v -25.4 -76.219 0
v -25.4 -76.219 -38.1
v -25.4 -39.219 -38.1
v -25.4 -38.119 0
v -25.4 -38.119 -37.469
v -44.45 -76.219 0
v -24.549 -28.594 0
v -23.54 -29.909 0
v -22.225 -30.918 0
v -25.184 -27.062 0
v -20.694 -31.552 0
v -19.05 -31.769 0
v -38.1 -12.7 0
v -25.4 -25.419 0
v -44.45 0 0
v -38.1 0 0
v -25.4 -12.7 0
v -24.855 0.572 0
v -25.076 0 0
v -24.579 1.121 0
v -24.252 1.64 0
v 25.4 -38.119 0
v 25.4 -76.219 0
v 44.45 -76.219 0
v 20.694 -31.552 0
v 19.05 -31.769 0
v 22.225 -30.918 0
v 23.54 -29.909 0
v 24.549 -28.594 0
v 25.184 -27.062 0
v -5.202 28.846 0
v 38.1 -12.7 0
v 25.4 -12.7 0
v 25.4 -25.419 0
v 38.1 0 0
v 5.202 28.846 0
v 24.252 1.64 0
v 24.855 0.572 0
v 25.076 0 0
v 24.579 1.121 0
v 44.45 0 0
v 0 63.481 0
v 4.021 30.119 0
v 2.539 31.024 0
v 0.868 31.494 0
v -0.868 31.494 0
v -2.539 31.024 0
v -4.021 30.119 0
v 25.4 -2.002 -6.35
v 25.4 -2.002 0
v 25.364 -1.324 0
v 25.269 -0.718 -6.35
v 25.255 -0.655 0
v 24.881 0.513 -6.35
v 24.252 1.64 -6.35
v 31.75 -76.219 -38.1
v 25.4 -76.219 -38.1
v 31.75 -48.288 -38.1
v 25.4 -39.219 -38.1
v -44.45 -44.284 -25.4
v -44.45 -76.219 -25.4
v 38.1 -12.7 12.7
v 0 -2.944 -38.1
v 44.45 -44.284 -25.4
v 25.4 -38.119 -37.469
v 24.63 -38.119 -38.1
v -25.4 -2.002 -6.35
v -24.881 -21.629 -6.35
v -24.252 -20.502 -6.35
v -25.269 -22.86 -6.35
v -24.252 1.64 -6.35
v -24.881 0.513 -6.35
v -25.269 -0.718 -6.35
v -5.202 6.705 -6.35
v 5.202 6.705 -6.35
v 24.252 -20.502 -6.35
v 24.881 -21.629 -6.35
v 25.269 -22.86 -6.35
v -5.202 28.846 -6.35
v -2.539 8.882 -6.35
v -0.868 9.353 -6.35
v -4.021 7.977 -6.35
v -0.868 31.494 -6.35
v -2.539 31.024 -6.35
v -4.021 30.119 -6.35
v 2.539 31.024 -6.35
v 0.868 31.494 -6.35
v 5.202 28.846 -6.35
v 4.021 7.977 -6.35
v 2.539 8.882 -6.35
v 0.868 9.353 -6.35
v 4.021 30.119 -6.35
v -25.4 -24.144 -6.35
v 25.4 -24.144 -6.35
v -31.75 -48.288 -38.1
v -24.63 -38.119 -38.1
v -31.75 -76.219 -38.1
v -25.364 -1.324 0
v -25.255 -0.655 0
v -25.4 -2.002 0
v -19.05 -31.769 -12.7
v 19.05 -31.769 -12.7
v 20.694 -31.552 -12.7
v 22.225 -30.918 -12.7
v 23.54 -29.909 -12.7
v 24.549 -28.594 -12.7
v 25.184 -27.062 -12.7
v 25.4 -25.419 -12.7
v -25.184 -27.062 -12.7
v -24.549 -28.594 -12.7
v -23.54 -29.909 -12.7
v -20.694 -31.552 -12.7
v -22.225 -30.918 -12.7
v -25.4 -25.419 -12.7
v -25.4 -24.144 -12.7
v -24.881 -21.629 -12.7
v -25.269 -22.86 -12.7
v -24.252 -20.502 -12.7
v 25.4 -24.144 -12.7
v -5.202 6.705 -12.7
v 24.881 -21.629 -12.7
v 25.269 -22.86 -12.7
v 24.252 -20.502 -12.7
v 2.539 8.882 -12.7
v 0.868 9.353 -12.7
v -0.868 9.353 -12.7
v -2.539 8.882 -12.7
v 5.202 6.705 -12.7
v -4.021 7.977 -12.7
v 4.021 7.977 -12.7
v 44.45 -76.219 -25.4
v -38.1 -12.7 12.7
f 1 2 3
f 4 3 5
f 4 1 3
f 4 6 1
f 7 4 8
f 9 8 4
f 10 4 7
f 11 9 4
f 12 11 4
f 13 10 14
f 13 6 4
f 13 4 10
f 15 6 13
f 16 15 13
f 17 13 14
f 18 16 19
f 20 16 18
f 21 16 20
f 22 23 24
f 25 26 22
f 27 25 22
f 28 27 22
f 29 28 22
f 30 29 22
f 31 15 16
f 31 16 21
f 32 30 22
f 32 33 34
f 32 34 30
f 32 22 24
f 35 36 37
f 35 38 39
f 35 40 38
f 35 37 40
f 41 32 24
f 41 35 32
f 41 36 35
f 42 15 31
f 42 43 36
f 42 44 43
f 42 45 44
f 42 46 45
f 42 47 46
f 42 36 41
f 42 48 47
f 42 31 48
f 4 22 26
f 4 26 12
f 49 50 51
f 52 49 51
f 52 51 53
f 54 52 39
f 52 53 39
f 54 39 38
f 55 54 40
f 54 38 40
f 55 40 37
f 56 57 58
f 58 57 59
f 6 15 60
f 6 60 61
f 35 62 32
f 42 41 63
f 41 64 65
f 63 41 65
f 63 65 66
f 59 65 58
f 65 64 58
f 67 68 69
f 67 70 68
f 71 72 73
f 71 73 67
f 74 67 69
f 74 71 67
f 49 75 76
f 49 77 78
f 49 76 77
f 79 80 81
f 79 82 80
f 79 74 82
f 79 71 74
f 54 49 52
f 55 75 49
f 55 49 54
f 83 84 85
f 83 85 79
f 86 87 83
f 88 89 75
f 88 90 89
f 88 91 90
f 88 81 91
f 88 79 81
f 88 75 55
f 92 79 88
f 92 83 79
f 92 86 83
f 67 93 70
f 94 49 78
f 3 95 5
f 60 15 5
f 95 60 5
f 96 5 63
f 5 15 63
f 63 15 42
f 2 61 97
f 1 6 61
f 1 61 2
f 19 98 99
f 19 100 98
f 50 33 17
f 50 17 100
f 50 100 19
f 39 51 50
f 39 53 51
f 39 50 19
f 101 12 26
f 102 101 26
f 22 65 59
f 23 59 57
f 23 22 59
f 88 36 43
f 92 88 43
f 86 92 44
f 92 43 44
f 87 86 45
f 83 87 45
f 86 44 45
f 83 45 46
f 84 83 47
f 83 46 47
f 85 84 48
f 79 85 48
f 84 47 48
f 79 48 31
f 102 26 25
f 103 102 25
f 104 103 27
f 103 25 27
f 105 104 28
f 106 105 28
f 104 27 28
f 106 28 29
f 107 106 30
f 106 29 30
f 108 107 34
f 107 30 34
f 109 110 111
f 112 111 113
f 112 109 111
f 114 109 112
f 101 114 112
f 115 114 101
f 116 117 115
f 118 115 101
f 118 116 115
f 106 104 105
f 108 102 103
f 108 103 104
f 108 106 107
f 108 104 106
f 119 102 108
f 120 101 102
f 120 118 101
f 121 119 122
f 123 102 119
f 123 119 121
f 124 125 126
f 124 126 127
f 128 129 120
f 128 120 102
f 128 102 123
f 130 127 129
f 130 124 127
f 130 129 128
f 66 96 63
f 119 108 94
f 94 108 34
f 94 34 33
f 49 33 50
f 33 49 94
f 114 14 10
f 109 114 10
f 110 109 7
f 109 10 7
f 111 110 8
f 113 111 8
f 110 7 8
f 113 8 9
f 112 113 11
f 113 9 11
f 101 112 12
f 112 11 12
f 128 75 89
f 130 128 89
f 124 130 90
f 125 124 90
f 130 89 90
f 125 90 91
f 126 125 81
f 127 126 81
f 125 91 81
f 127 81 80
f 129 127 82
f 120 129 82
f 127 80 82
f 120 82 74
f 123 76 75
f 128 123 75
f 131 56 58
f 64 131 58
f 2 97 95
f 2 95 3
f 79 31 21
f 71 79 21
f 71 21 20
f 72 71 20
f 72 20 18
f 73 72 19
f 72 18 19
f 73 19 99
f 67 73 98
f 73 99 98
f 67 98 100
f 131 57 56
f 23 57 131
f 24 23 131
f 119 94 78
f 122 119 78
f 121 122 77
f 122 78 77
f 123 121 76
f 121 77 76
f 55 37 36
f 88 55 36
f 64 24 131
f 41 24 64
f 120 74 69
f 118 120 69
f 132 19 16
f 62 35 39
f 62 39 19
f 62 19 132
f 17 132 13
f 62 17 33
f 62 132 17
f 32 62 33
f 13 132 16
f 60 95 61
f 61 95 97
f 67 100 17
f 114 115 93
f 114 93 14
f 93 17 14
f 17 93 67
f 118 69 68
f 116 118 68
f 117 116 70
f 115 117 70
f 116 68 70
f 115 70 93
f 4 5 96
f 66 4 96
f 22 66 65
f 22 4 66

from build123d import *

# Parameters (mm, degrees)
F1_DEPTH    = 38.1
F2_T1_DEPTH = 273.4584537484
F2_T3_DEPTH = 273.4584537484
F3_SIZE     = 12.7
F5_DEPTH    = 6.35
F8_DEPTH    = 12.7
F9_DEPTH    = 38.1


# Not quite as in the source:
# - a fillet or chamfer that OpenCascade refuses, or shapes differently, is made with other operations: its cross-section is extruded or revolved along the edge and cut away or added


with BuildPart() as f1:
    # F0 (on Top) → F1 (new body)
    with BuildSketch(Plane.XY):
        Polygon((0, 63.4811788997), (-44.45, 0), (44.45, 0), align=None)
        Polygon((44.45, 0), (-44.45, 0), (-44.45, -76.2188211003), (-25.4, -76.2188211003), (-25.4, -38.1188211003), (25.4, -38.1188211003), (25.4, -76.2188211003), (44.45, -76.2188211003), align=None)
    extrude(amount=-F1_DEPTH)

    # F2: chamfer of 38.1 on 2 edges, made by hand

    # F2_s2 → F2_t1 (cut)
    with BuildSketch(Plane(origin=(70.8232650101, -101.1461047552, 0), x_dir=(0, 0, 1), z_dir=(-0.5735764364, 0.8191520443, 0))):
        Polygon((0, 36.4113083686), (-38.1, -1.6886916314), (-38.1, 36.4113083686), align=None)
    extrude(amount=F2_T1_DEPTH, mode=Mode.SUBTRACT)

    # F2_s4 → F2_t3 (cut)
    with BuildSketch(Plane(origin=(86.0260603809, 122.8579466609, 0), x_dir=(0, 0, 1), z_dir=(-0.5735764364, -0.8191520443, 0))):
        Polygon((0, 36.4113083686), (-38.1, -1.6886916314), (-38.1, 36.4113083686), align=None)
    extrude(amount=F2_T3_DEPTH, mode=Mode.SUBTRACT)

    # F3
    f3_edges = [f1.edges().sort_by_distance(p)[0] for p in [
        (44.45, -71.322072, -38.1),
        (-44.45, -71.322072, -38.1),
    ]]
    chamfer(f3_edges, length=F3_SIZE)

    # F4 (on Top) → F5 (cut)
    with BuildSketch(Plane.XY):
        with BuildLine():
            ThreePointArc((5.2016154812, 28.8462825899), (0, 31.5540722191), (-5.2016154812, 28.8462825899))
            Line((-5.2016154812, 28.8462825899), (-24.2516154812, 1.6400630614))
            ThreePointArc((-24.2516154812, 1.6400630614), (-25.1061026373, -0.0926654825), (-25.4, -2.0021473094))
            Line((-25.4, -2.0021473094), (-25.4, -25.4188211003))
            ThreePointArc((-25.4, -25.4188211003), (-23.5401280605, -29.9089491608), (-19.05, -31.7688211003))
            Line((-19.05, -31.7688211003), (0, -31.7688211003))
            Line((0, -31.7688211003), (19.05, -31.7688211003))
            ThreePointArc((19.05, -31.7688211003), (23.5401280605, -29.9089491608), (25.4, -25.4188211003))
            Line((25.4, -25.4188211003), (25.4, -2.0021473094))
            ThreePointArc((25.4, -2.0021473094), (25.1061026373, -0.0926654825), (24.2516154812, 1.6400630614))
            Line((24.2516154812, 1.6400630614), (5.2016154812, 28.8462825899))
        make_face()
    extrude(amount=-F5_DEPTH, mode=Mode.SUBTRACT)

    # F7 (on Top) → F8 (cut)
    with BuildSketch(Plane.XY):
        with BuildLine():
            Line((-19.05, -31.7688211003), (0, -31.7688211003))
            Line((0, -31.7688211003), (19.05, -31.7688211003))
            ThreePointArc((19.05, -31.7688211003), (23.5401280605, -29.9089491608), (25.4, -25.4188211003))
            Line((25.4, -25.4188211003), (25.4, -24.1439216138))
            ThreePointArc((25.4, -24.1439216138), (25.1061026373, -22.2344397869), (24.2516154812, -20.5017112429))
            Line((24.2516154812, -20.5017112429), (5.2016154812, 6.7045082855))
            ThreePointArc((5.2016154812, 6.7045082855), (0, 9.4122979147), (-5.2016154812, 6.7045082855))
            Line((-5.2016154812, 6.7045082855), (-24.2516154812, -20.5017112429))
            ThreePointArc((-24.2516154812, -20.5017112429), (-25.1061026373, -22.2344397869), (-25.4, -24.1439216138))
            Line((-25.4, -24.1439216138), (-25.4, -25.4188211003))
            ThreePointArc((-25.4, -25.4188211003), (-23.5401280605, -29.9089491608), (-19.05, -31.7688211003))
        make_face()
    extrude(amount=-F8_DEPTH, mode=Mode.SUBTRACT)

    # F6 (on Right) → F9 (join, symmetric)
    with BuildSketch(Plane.YZ):
        Polygon((-12.7, 12.7), (-12.7, 0), (0, 0), align=None)
    extrude(amount=F9_DEPTH, both=True)


solid = f1.part
